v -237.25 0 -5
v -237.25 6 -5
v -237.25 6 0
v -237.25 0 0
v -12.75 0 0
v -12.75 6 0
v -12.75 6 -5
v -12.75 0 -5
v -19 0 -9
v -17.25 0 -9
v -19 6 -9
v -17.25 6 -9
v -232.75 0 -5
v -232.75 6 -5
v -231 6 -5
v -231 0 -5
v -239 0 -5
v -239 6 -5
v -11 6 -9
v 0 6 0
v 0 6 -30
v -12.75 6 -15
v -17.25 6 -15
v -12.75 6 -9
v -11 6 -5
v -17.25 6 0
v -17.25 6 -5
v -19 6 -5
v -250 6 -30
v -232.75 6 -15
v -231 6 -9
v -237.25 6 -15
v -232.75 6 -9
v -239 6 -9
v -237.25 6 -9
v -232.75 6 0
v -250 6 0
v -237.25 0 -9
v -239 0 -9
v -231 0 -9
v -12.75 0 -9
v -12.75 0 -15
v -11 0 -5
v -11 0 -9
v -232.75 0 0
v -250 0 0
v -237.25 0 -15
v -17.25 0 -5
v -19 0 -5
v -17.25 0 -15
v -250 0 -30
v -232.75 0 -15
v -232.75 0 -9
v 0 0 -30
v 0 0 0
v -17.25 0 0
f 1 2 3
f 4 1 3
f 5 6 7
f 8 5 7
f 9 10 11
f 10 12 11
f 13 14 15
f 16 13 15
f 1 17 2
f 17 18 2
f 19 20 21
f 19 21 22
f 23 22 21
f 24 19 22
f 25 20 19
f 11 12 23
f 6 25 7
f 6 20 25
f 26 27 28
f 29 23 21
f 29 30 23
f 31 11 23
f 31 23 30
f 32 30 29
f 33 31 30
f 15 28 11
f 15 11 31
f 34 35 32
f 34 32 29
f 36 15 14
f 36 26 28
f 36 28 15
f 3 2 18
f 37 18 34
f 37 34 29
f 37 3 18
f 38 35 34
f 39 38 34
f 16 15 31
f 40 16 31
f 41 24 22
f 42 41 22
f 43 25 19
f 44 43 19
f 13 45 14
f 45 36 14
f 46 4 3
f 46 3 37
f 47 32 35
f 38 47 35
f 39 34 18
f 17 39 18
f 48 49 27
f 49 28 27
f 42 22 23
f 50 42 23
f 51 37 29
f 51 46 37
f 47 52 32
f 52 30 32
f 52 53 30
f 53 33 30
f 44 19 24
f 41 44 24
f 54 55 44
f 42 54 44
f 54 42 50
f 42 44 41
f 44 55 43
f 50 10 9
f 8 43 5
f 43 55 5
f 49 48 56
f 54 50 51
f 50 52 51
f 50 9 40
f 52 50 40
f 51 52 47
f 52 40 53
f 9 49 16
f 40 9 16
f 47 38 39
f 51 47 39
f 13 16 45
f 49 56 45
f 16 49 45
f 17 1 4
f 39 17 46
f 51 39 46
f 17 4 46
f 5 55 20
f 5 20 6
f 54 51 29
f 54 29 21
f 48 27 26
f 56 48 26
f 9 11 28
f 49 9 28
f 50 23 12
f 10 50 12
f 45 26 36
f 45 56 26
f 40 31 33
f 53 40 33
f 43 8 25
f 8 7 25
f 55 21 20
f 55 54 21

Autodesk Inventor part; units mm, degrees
ref_plane "YZ Plane" through (0, 0, 0) normal (1, 0, 0) x (0, 1, 0)
ref_plane "XZ Plane" through (0, 0, 0) normal (0, 1, 0) x (-1, 0, 0)
ref_plane "XY Plane" through (0, 0, 0) normal (0, 0, 1) x (1, 0, 0)
sketch "Sketch3" plane through (0, 0, 0) normal (0, 1, 0) x (-1, 0, 0)
  line L0 (0, 0) -> (250, 0)
  line L1 (250, 0) -> (250, -30)
  line L2 (250, -30) -> (0, -30)
  line L3 (0, -30) -> (0, 0)
  dimension "d24" = 250
  dimension "d25" = 30
extrude "Extrusion2" add sketch "Sketch3" along normal blind 6
sketch "Sketch4" plane through (0, 6, 0) normal (0, 1, 0) x (1, 0, 0)
  line L0 (-250, 0) -> (0, 0) projected
  line L1 (-17.25, 0) -> (-12.75, 0)
  line L2 (-12.75, 0) -> (-12.75, 15)
  line L3 (-12.75, 15) -> (-17.25, 15)
  line L4 (-17.25, 15) -> (-17.25, 0)
  line L5 (-19, 5) -> (-11, 5)
  line L6 (-11, 5) -> (-11, 9)
  line L7 (-11, 9) -> (-19, 9)
  line L8 (-19, 9) -> (-19, 5)
  line L9 (0, 0) -> (0, 30) projected
  point P0 (-15, 9)
  point P1 (-15, 15)
  dimension "d28" = 4.5
  dimension "d29" = 15
  dimension "d30" = 8
  dimension "d31" = 5
  dimension "d32" = 4
  dimension "d33" = 12.75
extrude "Extrusion3" cut sketch "Sketch4" against normal through all
ref_plane "Work Plane13" through (-125, 0, 0) normal (1, 0, 0) x (0, 0, -1)
mirror "Mirror1" about plane through (-125, 0, 0) normal (1, 0, 0) of "Extrusion3"
properties part number "Selection_Ramp 1_Mid piece" material "Wood (Cherry)"
